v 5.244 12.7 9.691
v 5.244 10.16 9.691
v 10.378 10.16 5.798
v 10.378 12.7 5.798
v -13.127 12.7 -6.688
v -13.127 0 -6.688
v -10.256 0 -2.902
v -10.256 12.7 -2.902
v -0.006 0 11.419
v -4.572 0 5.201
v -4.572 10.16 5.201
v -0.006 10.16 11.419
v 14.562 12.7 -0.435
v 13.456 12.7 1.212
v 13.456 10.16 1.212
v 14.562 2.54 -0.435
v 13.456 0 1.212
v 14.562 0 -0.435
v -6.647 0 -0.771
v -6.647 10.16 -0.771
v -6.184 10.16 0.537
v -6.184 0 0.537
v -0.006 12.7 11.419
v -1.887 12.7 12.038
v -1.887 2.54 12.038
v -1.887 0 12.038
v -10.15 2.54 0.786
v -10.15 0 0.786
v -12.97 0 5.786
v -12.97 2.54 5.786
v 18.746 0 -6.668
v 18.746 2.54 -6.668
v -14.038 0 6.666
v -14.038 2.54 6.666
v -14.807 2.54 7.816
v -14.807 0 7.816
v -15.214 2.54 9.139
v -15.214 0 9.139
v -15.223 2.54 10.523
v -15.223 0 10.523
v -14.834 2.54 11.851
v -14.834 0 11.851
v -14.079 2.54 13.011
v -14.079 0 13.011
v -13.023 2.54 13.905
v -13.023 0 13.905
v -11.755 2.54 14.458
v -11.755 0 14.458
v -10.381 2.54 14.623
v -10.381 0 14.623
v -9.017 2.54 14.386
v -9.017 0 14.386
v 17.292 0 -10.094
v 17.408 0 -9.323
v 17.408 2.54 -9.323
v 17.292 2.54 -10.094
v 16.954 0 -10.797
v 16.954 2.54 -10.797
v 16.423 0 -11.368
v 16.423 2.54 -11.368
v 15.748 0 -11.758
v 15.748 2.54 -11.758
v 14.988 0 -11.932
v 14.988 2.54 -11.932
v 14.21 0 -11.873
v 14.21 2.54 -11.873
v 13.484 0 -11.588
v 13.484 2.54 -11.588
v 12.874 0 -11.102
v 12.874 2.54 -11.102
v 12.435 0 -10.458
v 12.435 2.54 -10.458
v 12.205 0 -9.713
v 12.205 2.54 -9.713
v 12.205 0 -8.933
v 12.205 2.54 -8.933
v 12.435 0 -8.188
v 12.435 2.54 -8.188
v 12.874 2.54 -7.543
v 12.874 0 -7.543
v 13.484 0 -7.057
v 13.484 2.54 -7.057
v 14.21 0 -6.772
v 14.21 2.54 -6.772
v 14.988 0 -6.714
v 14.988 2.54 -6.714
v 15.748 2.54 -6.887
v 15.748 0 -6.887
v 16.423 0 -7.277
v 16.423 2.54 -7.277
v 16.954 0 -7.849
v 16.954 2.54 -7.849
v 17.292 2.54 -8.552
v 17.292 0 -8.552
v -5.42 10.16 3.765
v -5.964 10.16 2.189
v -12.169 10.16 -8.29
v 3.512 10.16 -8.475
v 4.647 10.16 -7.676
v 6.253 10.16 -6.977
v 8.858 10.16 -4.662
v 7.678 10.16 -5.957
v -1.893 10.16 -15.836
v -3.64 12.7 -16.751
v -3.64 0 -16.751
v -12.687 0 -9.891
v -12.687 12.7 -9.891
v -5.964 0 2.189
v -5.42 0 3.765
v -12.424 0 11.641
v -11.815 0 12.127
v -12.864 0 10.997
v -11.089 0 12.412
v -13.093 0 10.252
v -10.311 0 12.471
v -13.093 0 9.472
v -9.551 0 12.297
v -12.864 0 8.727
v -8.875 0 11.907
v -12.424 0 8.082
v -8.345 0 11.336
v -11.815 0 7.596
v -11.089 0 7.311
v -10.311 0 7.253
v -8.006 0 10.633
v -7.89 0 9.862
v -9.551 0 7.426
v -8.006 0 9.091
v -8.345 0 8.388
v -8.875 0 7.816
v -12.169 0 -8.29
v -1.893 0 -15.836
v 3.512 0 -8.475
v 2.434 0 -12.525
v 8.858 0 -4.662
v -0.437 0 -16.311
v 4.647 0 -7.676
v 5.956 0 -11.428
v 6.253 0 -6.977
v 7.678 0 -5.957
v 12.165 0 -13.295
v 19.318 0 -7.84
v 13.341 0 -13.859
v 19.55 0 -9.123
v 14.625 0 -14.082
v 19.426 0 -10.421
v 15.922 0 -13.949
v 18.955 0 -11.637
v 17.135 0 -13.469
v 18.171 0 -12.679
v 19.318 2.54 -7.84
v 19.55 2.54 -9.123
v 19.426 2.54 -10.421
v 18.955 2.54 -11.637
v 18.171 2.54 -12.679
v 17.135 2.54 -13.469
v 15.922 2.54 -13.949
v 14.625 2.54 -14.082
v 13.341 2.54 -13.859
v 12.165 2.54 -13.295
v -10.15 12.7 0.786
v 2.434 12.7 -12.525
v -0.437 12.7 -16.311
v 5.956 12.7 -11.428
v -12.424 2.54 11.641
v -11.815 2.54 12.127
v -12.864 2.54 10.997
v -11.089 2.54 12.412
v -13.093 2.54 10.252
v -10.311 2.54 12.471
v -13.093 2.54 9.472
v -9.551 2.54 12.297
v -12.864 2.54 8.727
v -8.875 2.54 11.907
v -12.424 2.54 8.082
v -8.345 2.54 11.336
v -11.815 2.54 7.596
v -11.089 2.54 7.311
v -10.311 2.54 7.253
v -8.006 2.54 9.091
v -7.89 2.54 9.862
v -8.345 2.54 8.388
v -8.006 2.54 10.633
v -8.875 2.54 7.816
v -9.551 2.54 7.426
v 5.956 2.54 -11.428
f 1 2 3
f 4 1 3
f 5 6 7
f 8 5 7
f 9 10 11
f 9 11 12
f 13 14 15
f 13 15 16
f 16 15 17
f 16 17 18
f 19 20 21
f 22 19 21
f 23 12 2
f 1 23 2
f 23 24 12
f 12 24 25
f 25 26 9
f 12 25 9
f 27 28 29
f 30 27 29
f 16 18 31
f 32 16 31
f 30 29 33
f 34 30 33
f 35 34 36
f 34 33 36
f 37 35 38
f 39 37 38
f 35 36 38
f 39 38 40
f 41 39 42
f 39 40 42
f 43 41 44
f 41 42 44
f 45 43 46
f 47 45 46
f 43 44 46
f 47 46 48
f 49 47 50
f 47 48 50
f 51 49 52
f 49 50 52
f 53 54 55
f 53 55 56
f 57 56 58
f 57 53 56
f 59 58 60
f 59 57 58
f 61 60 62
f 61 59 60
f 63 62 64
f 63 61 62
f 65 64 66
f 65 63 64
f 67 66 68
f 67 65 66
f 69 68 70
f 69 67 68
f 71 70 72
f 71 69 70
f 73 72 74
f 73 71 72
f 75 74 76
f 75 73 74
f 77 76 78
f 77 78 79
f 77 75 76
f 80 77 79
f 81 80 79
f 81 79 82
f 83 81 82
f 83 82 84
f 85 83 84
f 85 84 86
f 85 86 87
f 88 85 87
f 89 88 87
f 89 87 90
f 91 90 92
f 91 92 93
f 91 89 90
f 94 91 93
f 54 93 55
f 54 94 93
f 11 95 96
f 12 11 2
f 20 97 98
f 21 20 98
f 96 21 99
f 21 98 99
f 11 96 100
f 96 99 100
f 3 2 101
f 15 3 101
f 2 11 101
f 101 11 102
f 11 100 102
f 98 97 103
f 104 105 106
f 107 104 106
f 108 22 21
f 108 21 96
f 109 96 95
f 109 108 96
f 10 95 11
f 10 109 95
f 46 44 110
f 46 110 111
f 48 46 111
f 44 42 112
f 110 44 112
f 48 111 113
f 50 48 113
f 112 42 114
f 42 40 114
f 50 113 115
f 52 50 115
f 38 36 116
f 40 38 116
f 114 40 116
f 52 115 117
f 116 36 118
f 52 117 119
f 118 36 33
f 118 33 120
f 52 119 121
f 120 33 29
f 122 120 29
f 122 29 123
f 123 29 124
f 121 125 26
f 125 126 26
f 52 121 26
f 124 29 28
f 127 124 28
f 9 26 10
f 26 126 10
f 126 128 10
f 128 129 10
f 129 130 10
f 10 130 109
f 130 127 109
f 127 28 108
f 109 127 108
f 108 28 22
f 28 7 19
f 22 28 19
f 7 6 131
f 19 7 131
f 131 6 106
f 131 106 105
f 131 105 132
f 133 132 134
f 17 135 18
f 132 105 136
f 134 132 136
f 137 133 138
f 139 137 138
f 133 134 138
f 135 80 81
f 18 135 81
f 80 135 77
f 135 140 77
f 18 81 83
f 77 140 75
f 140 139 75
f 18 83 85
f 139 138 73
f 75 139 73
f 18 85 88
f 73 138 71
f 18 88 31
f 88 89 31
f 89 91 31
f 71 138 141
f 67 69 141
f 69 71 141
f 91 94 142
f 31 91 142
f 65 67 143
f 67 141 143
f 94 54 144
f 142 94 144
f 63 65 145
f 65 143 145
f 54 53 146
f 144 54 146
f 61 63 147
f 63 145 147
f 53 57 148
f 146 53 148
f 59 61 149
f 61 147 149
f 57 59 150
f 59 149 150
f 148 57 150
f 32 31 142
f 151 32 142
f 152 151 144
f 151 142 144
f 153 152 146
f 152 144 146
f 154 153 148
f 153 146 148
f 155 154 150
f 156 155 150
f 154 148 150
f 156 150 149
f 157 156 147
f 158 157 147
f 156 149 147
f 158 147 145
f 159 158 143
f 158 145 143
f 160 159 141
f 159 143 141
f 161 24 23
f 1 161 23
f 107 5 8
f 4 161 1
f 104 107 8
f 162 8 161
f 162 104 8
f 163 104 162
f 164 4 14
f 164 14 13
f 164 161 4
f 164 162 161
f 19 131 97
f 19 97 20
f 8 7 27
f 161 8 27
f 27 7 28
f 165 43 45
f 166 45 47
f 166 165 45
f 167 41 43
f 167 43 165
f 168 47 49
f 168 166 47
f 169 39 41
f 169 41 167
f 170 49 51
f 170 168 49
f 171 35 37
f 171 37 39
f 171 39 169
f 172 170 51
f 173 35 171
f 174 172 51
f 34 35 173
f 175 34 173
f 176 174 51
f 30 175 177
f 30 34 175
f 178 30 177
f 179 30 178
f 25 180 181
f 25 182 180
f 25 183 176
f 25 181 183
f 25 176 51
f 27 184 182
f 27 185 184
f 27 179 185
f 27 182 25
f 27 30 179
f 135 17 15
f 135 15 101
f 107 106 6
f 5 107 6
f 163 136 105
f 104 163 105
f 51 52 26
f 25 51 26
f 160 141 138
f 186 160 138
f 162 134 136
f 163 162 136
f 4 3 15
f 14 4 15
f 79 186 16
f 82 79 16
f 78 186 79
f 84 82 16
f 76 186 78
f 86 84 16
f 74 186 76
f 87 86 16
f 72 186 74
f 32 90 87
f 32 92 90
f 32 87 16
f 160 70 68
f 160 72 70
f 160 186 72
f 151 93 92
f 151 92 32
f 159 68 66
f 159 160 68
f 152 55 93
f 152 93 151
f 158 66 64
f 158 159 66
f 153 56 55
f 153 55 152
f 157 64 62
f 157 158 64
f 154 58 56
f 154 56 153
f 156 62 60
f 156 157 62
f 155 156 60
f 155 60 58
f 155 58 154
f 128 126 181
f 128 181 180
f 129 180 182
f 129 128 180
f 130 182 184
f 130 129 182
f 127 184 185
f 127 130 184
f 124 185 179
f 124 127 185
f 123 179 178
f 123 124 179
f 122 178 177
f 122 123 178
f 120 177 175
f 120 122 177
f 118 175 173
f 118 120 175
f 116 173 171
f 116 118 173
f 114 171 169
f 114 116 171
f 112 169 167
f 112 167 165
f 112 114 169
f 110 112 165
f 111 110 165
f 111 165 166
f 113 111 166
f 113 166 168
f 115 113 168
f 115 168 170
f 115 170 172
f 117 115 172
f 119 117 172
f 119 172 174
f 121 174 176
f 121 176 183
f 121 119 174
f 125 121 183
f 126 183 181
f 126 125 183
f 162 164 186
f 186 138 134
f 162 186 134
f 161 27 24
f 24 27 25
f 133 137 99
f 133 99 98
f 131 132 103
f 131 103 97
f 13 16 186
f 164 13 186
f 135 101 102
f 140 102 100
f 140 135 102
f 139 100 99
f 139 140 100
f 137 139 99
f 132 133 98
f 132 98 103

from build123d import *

# Parameters (mm, degrees)
SKETCH1_R             = 2.6162
BOSS_EXTRUDE1_DEPTH   = 2.54
BOSS_EXTRUDE1_2_DEPTH = 2.54
BOSS_EXTRUDE2_DEPTH   = 12.7
BOSS_EXTRUDE3_DEPTH   = 12.7
CUT_EXTRUDE1_DEPTH    = 10.16
BOSS_EXTRUDE5_DEPTH   = 12.7
CUT_EXTRUDE2_DEPTH    = 10.16


with BuildPart() as part:
    # Sketch1 → Boss-Extrude1 (new body)
    with BuildSketch(Plane(origin=(0, 0, 0), x_dir=(1, 0, 0), z_dir=(0, 1, 0))):
        with BuildLine():
            Line((-10.149829081, -0.78559745), (-12.970179614, -5.786096043))
            ThreePointArc((-12.970179614, -5.786096043), (-14.833663899, -11.850889023), (-9.017306722, -14.385504725))
            Line((-9.017306722, -14.385504725), (-1.886569513, -12.038188494))
            Line((-1.886569513, -12.038188494), (-10.149829081, -0.78559745))
        make_face()
        with Locations((-10.506432822, -9.861799418)):
            Circle(SKETCH1_R, mode=Mode.SUBTRACT)
    extrude(amount=BOSS_EXTRUDE1_DEPTH)



with BuildPart() as body_2:
    # Sketch1 → Boss-Extrude1 2 (new body)
    with BuildSketch(Plane(origin=(0, 0, 0), x_dir=(1, 0, 0), z_dir=(0, 1, 0))):
        with BuildLine():
            Line((5.95620443, 11.428082994), (14.562195858, 0.435395631))
            Line((14.562195858, 0.435395631), (18.746273034, 6.66843701))
            ThreePointArc((18.746273034, 6.66843701), (18.171308738, 12.678699935), (12.165175551, 13.29531044))
            Line((12.165175551, 13.29531044), (5.95620443, 11.428082994))
        make_face()
        with Locations((14.792061634, 9.322795398)):
            Circle(SKETCH1_R, mode=Mode.SUBTRACT)
    extrude(amount=BOSS_EXTRUDE1_2_DEPTH)


with BuildPart() as part_1:
    add(part.part)

    add(body_2.part)  # Boss-Extrude2 merges body 2
    # Sketch1<5> → Boss-Extrude2 (add)
    with BuildSketch(Plane(origin=(0, 0, 0), x_dir=(1, 0, 0), z_dir=(0, 1, 0))):
        with BuildLine():
            Line((-10.256120569, 2.902434291), (-10.149829081, -0.78559745))
            Line((-10.149829081, -0.78559745), (-1.886569513, -12.038188494))
            Line((-1.886569513, -12.038188494), (-0.005832357, -11.419082121))
            Line((-0.005832357, -11.419082121), (-4.572272753, -5.200678127))
            ThreePointArc((-4.572272753, -5.200678127), (-5.731382948, -2.990882077), (-6.18409173, -0.536948544))
            Line((-6.18409173, -0.536948544), (-6.647421935, 0.770957563))
            Line((-6.647421935, 0.770957563), (-12.168687381, 8.289605816))
            Line((-12.168687381, 8.289605816), (-1.892547948, 15.835815142))
            Line((-1.892547948, 15.835815142), (3.512453439, 8.475490841))
            Line((3.512453439, 8.475490841), (4.646859497, 7.676481354))
            ThreePointArc((4.646859497, 7.676481354), (6.992594353, 6.504605156), (8.857901564, 4.661674107))
            Line((8.857901564, 4.661674107), (13.456324189, -1.212027104))
            Line((13.456324189, -1.212027104), (14.562195858, 0.435395631))
            Line((14.562195858, 0.435395631), (5.95620443, 11.428082994))
            Line((5.95620443, 11.428082994), (2.433604251, 12.525427051))
            Line((2.433604251, 12.525427051), (-0.436996693, 16.310853991))
            Line((-0.436996693, 16.310853991), (-3.639779121, 16.751054765))
            Line((-3.639779121, 16.751054765), (-12.686520738, 9.890643659))
            Line((-12.686520738, 9.890643659), (-13.126721512, 6.687861232))
            Line((-13.126721512, 6.687861232), (-10.256120569, 2.902434291))
        make_face()
    extrude(amount=BOSS_EXTRUDE2_DEPTH)

    # Sketch1<6> → Boss-Extrude3 (add)
    with BuildSketch(Plane(origin=(0, 0, 0), x_dir=(1, 0, 0), z_dir=(0, 1, 0))):
        with BuildLine():
            Line((-6.647421935, 0.770957563), (-6.18409173, -0.536948544))
            ThreePointArc((-6.18409173, -0.536948544), (7.176852085, -6.907826955), (4.646859497, 7.676481354))
            Line((4.646859497, 7.676481354), (3.512453439, 8.475490841))
            Line((3.512453439, 8.475490841), (-1.892547948, 15.835815142))
            Line((-1.892547948, 15.835815142), (-12.168687381, 8.289605816))
            Line((-12.168687381, 8.289605816), (-6.647421935, 0.770957563))
        make_face()
    extrude(amount=BOSS_EXTRUDE3_DEPTH)

    # Sketch1<8> → Cut-Extrude1 (cut)
    with BuildSketch(Plane(origin=(0, 0, 0), x_dir=(1, 0, 0), z_dir=(0, 1, 0))):
        with BuildLine():
            Line((-6.647421935, 0.770957563), (-6.18409173, -0.536948544))
            ThreePointArc((-6.18409173, -0.536948544), (7.176852085, -6.907826955), (4.646859497, 7.676481354))
            Line((4.646859497, 7.676481354), (3.512453439, 8.475490841))
            Line((3.512453439, 8.475490841), (-1.892547948, 15.835815142))
            Line((-1.892547948, 15.835815142), (-12.168687381, 8.289605816))
            Line((-12.168687381, 8.289605816), (-6.647421935, 0.770957563))
        make_face()
    extrude(amount=CUT_EXTRUDE1_DEPTH, mode=Mode.SUBTRACT)

    # Sketch1<9> → Boss-Extrude5 (add)
    with BuildSketch(Plane(origin=(0, 0, 0), x_dir=(1, 0, 0), z_dir=(0, 1, 0))):
        with BuildLine():
            Line((-4.572272753, -5.200678127), (-0.005832357, -11.419082121))
            Line((-0.005832357, -11.419082121), (5.244167697, -9.690872263))
            Line((5.244167697, -9.690872263), (10.378118681, -5.797645747))
            Line((10.378118681, -5.797645747), (13.456324189, -1.212027104))
            Line((13.456324189, -1.212027104), (8.857901564, 4.661674107))
            ThreePointArc((8.857901564, 4.661674107), (7.073990523, -6.984589168), (-4.572272753, -5.200678127))
        make_face()
    extrude(amount=BOSS_EXTRUDE5_DEPTH)

    # Sketch1<11> → Cut-Extrude2 (cut)
    with BuildSketch(Plane(origin=(0, 0, 0), x_dir=(1, 0, 0), z_dir=(0, 1, 0))):
        with BuildLine():
            Line((-4.572272753, -5.200678127), (-0.005832357, -11.419082121))
            Line((-0.005832357, -11.419082121), (5.244167697, -9.690872263))
            Line((5.244167697, -9.690872263), (10.378118681, -5.797645747))
            Line((10.378118681, -5.797645747), (13.456324189, -1.212027104))
            Line((13.456324189, -1.212027104), (8.857901564, 4.661674107))
            ThreePointArc((8.857901564, 4.661674107), (7.073990523, -6.984589168), (-4.572272753, -5.200678127))
        make_face()
    extrude(amount=CUT_EXTRUDE2_DEPTH, mode=Mode.SUBTRACT)


solid = part_1.part
